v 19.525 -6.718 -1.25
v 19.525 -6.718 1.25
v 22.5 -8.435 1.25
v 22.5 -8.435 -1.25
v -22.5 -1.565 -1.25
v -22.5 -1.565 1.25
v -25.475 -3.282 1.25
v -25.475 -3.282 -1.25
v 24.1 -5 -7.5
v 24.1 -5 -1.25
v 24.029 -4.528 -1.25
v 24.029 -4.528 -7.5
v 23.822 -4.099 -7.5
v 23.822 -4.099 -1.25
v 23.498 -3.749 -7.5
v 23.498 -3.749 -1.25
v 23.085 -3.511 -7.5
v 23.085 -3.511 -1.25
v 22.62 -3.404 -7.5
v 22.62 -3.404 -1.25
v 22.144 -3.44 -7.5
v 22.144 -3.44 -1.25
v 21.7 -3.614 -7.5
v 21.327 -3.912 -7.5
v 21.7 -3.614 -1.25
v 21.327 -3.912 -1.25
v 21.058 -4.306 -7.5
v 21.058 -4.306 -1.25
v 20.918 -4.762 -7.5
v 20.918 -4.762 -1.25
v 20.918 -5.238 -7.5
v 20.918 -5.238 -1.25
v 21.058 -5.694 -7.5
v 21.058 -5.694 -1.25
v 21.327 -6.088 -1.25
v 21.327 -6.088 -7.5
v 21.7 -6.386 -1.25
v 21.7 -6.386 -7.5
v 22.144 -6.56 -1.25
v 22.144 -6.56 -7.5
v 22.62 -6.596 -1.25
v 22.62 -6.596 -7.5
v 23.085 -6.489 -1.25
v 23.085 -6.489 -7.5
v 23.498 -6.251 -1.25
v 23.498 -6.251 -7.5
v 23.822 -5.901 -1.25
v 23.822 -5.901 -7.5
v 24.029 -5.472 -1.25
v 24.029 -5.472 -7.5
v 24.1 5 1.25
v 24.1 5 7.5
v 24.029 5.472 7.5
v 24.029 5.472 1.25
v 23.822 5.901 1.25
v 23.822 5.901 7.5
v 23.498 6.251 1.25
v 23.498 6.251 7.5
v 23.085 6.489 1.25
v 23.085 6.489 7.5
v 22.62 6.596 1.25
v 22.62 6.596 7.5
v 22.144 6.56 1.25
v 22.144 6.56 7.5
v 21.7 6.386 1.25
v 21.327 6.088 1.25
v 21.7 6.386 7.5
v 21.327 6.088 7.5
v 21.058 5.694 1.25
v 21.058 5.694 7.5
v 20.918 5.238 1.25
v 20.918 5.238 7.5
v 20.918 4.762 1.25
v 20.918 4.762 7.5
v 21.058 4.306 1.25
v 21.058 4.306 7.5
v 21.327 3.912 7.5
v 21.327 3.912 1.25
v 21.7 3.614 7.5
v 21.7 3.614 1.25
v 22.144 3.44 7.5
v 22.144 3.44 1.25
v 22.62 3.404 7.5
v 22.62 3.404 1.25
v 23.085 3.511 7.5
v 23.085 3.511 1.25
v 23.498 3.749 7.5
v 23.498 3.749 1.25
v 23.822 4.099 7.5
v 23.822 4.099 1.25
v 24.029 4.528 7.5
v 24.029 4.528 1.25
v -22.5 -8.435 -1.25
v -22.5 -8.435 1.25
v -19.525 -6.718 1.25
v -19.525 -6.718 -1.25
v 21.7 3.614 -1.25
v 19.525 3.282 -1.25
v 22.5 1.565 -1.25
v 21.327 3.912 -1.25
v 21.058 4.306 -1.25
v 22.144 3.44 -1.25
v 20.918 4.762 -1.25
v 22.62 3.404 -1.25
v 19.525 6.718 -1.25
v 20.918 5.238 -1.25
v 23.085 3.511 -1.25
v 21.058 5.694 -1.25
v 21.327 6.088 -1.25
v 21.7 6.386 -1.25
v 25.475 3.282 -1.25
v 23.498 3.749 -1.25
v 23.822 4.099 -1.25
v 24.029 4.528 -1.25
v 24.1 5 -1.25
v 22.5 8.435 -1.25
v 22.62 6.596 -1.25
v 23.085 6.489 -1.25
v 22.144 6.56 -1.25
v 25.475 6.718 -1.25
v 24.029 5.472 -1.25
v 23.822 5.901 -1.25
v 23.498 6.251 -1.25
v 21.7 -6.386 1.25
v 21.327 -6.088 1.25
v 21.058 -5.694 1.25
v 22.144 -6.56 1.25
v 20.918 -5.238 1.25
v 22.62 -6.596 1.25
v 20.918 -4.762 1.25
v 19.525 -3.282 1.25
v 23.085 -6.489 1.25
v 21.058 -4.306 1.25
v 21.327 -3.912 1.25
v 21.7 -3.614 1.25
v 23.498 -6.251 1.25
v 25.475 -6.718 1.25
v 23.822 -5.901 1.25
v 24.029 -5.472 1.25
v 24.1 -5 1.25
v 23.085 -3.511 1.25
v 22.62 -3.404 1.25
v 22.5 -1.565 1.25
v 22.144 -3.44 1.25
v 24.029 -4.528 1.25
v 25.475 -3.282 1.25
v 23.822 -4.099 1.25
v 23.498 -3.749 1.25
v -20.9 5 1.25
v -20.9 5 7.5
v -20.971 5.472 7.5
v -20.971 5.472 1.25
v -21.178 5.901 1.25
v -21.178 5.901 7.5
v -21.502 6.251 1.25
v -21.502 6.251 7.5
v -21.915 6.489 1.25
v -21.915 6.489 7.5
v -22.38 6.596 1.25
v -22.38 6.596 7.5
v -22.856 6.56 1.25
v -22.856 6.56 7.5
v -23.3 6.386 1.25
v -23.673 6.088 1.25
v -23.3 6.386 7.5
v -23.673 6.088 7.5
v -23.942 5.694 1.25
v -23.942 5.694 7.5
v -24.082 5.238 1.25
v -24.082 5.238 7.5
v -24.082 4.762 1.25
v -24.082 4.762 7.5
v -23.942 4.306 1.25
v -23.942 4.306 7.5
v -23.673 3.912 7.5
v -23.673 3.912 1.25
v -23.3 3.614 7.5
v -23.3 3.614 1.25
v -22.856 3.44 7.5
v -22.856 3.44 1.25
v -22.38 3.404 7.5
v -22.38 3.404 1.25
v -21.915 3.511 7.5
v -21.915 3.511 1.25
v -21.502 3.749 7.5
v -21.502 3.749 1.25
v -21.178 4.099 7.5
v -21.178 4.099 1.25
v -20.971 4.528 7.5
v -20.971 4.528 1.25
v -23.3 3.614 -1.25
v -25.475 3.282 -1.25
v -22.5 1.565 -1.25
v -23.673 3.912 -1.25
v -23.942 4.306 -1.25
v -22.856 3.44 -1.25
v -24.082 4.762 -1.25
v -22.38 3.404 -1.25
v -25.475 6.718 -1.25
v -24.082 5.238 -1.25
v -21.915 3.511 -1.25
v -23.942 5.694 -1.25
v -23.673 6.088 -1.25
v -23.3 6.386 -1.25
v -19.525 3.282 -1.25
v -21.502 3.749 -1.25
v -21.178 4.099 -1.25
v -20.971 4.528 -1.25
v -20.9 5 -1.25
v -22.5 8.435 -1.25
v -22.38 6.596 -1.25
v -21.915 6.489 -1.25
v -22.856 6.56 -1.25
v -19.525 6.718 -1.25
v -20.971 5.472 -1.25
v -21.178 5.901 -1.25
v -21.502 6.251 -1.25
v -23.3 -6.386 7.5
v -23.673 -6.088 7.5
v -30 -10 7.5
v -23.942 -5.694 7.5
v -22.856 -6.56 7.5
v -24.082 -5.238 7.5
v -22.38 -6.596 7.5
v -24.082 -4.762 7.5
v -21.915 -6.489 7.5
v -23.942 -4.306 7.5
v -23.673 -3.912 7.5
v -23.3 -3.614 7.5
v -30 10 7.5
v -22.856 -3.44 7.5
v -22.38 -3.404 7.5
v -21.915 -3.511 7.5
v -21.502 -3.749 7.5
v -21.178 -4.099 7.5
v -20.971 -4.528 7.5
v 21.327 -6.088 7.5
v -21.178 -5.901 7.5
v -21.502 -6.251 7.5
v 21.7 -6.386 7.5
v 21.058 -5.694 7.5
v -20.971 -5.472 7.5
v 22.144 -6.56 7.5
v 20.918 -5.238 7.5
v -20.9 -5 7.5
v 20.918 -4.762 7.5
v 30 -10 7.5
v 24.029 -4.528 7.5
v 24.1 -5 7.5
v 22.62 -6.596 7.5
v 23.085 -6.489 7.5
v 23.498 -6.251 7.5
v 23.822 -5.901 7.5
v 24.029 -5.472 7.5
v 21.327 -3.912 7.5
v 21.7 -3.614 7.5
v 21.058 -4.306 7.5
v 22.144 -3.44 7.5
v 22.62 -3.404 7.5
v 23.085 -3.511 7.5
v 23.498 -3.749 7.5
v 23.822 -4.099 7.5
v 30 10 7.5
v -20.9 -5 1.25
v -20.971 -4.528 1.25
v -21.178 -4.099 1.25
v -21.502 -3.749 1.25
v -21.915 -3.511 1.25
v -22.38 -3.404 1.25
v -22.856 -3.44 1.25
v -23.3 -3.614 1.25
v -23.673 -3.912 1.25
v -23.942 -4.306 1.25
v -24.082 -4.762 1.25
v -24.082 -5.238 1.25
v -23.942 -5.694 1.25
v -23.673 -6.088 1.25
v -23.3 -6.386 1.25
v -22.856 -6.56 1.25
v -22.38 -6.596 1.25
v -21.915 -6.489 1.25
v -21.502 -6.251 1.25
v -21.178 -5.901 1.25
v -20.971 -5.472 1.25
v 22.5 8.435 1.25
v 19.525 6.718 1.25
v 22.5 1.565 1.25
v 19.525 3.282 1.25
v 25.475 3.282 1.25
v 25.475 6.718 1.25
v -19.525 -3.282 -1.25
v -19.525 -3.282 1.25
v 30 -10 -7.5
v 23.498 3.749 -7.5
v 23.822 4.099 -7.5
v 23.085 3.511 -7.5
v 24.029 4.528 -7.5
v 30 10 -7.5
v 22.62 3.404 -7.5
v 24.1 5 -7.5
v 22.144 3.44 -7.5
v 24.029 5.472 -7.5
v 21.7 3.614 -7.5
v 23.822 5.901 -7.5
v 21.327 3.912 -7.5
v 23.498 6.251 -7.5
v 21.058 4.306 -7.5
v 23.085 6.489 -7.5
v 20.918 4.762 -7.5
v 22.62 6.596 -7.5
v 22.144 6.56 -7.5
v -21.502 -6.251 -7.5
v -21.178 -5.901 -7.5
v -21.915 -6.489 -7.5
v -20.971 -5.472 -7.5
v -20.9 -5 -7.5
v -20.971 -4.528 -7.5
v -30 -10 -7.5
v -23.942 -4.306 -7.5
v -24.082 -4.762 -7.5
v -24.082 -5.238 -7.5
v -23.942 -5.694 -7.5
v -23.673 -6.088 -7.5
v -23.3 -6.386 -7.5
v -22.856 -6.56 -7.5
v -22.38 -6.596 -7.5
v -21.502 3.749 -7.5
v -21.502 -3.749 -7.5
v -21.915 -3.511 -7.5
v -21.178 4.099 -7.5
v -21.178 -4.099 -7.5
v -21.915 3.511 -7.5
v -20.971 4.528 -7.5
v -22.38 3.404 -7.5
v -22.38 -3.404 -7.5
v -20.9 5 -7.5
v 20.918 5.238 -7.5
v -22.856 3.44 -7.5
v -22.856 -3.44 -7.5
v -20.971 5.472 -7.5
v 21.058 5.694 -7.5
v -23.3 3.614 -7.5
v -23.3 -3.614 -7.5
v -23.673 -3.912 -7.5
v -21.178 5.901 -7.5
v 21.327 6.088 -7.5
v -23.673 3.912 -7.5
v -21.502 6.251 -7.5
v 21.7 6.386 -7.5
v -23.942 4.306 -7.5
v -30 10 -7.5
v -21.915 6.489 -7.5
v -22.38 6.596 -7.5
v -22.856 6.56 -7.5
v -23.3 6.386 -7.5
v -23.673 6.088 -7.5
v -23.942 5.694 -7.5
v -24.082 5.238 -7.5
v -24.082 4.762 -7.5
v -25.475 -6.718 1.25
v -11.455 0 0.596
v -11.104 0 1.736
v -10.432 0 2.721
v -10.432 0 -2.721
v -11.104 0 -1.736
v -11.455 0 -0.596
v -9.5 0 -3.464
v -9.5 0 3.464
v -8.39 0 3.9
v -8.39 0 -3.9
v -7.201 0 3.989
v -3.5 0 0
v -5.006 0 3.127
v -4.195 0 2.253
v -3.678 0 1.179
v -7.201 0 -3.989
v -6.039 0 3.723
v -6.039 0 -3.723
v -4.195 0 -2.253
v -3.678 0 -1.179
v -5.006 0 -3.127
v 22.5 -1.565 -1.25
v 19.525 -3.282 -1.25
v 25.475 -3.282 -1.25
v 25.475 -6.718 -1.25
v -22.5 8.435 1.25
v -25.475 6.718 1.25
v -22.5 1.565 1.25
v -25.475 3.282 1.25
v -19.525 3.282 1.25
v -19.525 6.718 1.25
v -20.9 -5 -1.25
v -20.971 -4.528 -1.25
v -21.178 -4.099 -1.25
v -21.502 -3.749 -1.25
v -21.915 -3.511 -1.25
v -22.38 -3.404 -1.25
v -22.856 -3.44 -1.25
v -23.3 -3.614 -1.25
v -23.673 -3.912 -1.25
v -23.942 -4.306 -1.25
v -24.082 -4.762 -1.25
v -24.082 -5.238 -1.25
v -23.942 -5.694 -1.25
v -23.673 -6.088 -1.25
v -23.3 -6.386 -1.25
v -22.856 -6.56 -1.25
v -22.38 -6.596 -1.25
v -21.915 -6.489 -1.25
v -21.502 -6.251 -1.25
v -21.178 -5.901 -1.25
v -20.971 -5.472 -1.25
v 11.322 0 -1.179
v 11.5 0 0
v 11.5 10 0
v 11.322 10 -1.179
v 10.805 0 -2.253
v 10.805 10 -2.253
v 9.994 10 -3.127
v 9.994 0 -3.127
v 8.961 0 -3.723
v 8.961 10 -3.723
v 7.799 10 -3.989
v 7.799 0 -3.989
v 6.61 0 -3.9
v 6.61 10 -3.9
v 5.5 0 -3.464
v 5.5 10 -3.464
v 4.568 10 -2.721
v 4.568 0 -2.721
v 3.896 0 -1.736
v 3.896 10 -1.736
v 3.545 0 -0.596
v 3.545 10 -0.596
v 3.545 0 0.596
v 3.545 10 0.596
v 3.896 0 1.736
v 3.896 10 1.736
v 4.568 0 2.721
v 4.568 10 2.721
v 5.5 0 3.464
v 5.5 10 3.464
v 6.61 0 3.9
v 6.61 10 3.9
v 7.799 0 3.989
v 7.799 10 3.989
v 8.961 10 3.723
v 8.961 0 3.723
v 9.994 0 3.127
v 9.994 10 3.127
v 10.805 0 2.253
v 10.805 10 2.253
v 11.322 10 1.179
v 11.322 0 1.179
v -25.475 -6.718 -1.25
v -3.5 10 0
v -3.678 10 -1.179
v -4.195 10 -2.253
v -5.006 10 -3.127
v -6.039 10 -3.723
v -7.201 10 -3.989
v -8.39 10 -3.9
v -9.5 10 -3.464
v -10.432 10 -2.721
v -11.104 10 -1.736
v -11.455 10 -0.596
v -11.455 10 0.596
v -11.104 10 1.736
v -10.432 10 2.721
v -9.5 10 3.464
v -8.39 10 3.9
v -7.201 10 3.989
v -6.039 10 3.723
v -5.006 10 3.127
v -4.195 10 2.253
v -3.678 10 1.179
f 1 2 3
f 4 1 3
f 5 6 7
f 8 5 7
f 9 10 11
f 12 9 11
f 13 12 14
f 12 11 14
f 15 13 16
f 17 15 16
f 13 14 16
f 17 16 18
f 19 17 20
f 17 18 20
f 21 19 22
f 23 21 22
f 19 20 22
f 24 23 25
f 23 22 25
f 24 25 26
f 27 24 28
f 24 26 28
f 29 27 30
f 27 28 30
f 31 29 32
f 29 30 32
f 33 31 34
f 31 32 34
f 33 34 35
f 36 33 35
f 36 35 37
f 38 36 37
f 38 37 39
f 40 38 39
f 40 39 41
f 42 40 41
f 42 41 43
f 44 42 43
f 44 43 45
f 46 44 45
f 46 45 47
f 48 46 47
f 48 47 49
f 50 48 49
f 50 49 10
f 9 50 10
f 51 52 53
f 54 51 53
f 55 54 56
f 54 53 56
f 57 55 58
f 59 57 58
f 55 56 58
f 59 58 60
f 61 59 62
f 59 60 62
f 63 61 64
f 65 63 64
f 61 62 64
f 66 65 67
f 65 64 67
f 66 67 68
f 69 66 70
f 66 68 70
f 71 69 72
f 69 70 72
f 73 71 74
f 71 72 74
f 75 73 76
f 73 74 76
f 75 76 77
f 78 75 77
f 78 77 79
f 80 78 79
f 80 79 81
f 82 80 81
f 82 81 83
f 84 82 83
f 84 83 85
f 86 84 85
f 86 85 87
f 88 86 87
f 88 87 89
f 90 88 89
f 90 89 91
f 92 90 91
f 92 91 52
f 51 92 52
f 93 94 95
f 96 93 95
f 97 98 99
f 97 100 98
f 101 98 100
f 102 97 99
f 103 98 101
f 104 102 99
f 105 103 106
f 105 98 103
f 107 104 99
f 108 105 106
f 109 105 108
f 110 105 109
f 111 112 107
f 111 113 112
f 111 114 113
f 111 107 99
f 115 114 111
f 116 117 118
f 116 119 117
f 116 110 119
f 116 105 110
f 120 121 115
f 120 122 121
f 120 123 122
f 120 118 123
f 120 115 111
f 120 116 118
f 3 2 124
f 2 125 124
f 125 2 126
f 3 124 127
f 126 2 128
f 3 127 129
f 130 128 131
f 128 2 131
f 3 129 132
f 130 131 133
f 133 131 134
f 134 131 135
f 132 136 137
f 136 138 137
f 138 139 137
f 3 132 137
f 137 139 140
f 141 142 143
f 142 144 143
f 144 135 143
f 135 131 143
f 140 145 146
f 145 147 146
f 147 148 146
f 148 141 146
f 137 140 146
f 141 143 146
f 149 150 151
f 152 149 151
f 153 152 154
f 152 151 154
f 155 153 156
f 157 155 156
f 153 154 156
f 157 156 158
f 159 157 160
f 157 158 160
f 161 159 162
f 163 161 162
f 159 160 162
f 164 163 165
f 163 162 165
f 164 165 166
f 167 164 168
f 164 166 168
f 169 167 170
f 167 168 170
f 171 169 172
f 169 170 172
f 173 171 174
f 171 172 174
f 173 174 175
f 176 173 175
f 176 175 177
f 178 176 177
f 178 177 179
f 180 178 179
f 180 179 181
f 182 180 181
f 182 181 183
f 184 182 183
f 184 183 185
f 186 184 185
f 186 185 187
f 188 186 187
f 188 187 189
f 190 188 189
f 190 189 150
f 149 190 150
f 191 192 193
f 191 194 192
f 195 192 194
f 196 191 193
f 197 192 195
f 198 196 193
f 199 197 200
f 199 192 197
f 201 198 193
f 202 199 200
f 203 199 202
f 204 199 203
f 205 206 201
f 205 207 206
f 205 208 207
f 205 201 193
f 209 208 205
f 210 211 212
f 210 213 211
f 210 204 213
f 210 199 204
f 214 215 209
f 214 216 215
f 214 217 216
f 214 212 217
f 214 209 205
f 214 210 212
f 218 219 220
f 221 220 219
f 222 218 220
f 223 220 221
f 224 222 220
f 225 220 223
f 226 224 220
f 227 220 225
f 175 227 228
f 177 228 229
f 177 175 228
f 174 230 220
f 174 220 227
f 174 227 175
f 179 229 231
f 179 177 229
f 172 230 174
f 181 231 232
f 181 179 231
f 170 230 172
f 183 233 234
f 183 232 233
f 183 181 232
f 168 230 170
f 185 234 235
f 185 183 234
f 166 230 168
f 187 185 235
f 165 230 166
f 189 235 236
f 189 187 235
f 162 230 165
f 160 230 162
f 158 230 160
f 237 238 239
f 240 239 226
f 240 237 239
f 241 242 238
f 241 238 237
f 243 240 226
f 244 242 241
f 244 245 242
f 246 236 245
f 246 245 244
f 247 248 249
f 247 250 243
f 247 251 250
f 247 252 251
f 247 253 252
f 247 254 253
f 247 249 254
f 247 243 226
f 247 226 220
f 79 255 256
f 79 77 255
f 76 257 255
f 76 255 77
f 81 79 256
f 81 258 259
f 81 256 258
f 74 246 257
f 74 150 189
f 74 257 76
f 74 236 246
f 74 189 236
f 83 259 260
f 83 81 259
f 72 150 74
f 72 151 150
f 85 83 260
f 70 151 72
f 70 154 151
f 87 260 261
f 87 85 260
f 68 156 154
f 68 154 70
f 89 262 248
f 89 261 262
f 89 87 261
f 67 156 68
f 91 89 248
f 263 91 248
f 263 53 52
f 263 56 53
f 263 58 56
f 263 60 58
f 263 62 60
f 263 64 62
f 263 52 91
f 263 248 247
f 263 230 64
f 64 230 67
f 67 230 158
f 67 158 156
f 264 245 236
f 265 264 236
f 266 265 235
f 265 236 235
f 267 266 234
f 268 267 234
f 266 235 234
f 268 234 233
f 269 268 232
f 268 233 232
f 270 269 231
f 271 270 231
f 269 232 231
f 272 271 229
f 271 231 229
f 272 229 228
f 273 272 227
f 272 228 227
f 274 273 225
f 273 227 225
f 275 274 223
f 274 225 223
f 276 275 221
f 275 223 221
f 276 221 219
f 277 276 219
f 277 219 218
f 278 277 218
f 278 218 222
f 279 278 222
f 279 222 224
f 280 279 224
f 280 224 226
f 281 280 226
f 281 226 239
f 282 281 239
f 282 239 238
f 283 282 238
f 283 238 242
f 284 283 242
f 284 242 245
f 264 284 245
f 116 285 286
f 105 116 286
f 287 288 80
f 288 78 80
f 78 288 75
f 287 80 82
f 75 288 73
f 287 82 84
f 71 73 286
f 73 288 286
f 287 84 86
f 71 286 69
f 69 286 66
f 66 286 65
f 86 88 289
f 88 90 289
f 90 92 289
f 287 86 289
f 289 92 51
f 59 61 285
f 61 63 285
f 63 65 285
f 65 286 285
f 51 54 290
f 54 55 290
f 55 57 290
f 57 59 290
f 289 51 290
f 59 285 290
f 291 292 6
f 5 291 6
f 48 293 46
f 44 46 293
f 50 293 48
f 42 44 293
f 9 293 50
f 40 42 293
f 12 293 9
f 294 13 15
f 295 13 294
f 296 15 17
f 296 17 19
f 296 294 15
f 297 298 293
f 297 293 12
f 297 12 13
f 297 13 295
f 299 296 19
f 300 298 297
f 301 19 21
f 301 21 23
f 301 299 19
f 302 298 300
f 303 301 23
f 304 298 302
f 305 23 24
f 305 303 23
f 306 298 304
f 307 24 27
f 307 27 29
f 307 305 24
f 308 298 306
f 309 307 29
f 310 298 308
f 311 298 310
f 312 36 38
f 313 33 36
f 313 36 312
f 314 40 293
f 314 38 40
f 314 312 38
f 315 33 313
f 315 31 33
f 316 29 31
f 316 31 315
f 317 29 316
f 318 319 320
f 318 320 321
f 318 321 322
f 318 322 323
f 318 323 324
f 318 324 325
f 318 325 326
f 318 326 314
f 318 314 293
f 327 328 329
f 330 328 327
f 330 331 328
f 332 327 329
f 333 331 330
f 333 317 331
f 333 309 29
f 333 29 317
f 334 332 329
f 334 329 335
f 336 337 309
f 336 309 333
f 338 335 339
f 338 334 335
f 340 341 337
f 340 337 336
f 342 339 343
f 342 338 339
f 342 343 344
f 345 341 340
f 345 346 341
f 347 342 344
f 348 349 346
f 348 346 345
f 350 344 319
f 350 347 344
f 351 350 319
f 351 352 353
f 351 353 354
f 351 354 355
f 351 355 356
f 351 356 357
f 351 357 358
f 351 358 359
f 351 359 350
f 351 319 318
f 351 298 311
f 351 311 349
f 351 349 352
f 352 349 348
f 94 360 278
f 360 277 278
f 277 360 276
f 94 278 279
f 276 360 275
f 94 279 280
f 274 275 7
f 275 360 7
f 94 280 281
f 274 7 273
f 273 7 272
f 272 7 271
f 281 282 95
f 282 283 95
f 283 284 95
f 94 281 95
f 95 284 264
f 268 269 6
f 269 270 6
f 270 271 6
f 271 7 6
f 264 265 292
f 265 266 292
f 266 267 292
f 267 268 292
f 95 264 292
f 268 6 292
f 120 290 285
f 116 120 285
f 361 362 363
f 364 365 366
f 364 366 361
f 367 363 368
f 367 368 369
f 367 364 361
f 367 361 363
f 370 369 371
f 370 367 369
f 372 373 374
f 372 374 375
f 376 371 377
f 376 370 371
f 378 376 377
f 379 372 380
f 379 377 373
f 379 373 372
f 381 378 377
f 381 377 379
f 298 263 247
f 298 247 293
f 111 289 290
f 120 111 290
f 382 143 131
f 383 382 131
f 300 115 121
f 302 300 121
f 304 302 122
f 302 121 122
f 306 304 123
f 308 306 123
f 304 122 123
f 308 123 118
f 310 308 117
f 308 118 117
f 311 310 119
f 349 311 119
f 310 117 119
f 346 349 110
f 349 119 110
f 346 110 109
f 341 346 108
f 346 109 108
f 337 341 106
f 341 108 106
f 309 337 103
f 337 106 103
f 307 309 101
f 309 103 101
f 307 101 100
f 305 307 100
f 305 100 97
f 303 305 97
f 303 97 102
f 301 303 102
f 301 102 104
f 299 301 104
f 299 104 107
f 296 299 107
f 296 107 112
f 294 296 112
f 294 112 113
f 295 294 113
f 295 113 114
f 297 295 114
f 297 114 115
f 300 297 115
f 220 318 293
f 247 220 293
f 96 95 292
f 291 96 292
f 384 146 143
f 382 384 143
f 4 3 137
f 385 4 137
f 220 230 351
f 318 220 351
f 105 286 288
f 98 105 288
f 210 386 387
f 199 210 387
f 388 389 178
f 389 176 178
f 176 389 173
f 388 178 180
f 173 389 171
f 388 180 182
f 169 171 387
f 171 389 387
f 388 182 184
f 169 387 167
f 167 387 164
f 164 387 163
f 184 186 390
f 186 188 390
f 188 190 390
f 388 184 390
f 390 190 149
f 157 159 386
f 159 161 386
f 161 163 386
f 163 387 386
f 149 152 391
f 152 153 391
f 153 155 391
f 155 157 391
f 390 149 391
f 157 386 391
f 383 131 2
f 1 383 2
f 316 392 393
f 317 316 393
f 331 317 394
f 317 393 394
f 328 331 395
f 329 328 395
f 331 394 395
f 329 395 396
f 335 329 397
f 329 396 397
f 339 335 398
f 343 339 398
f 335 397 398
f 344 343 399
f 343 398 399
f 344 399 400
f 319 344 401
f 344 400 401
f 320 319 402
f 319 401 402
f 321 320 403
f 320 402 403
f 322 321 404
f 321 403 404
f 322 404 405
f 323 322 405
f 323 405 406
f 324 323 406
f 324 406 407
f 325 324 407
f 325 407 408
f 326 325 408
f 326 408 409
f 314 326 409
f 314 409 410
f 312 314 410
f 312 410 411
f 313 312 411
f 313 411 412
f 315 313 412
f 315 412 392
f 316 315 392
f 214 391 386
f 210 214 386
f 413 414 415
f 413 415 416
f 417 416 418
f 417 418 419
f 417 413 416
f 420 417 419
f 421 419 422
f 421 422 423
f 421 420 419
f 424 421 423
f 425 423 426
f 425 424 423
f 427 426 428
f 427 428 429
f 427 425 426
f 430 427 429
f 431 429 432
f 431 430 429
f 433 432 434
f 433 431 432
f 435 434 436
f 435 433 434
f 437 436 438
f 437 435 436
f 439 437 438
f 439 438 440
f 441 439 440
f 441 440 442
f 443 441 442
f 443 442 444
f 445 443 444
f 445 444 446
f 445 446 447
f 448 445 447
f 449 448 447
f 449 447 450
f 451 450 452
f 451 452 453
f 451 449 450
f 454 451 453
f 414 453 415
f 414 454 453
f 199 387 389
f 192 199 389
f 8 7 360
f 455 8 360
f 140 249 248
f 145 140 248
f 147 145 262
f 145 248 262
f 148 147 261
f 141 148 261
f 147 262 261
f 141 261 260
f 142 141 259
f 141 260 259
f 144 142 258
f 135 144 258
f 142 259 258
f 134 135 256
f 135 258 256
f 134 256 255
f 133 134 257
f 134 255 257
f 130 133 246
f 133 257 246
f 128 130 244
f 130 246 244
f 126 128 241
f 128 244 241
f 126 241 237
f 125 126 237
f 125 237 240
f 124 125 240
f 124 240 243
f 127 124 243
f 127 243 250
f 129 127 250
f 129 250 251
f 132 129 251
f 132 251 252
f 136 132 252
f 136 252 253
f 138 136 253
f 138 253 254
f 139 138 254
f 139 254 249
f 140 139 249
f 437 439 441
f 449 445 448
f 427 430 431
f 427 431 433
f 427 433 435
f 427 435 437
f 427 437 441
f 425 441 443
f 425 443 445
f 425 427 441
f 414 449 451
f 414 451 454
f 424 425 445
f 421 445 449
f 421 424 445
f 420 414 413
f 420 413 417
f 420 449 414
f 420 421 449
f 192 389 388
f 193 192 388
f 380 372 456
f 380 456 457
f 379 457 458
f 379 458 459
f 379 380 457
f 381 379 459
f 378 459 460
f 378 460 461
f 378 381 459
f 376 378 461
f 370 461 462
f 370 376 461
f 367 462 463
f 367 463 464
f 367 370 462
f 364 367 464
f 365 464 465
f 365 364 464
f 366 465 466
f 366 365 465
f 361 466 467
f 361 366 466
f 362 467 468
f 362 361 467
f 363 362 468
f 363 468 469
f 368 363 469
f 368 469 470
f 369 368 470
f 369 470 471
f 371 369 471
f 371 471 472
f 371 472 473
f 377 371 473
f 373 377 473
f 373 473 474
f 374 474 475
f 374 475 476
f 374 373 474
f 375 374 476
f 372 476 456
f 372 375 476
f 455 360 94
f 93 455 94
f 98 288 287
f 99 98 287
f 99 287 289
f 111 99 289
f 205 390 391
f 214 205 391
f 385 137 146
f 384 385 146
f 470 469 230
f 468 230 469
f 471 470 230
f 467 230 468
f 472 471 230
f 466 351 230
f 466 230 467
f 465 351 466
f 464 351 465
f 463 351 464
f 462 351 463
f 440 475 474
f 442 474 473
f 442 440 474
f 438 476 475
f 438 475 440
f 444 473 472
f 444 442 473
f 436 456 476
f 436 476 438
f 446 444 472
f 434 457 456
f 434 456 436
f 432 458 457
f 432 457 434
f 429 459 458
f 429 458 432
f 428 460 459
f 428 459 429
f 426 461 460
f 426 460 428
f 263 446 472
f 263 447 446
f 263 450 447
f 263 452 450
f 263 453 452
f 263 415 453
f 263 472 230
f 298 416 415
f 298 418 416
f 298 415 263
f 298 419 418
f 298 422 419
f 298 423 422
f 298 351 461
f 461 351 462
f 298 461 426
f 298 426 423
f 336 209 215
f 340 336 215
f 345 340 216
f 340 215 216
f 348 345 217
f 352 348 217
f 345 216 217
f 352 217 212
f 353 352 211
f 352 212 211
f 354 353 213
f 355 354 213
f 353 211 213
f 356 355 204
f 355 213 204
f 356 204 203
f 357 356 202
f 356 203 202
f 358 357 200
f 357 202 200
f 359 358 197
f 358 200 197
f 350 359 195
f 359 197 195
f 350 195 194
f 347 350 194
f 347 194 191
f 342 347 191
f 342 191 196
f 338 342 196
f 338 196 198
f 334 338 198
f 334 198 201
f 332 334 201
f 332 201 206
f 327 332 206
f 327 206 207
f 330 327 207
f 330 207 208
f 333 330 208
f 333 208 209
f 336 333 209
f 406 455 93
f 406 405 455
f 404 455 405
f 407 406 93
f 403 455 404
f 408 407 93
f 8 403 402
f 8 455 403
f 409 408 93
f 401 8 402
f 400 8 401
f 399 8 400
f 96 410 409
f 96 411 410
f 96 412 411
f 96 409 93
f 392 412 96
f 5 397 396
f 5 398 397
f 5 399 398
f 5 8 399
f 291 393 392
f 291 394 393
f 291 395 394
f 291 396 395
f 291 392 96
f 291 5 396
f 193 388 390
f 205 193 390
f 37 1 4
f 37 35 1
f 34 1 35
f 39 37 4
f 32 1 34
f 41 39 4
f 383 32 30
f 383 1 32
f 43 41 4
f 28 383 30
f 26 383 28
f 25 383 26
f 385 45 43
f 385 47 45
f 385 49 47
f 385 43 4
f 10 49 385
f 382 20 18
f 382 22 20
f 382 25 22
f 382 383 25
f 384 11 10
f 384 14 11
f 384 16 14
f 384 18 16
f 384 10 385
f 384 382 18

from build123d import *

# Parameters (mm, degrees)
SKETCH2_W           = 60
SKETCH2_H           = 15
SKETCH2_R           = 4
BOSS_EXTRUDE1_DEPTH = 10
SKETCH2_3_W         = 60
SKETCH2_3_H         = 15
BOSS_EXTRUDE2_DEPTH = 10
SKETCH4_R           = 1.6
CUT_EXTRUDE1_DEPTH  = 36
CUT_EXTRUDE2_START  = -6.25
SKETCH4_3_R         = 1.6
CUT_EXTRUDE2_DEPTH  = 2.5


with BuildPart() as part:
    # Sketch2 → Boss-Extrude1 (new body)
    with BuildSketch(Plane(origin=(0, 0, 0), x_dir=(1, 0, 0), z_dir=(0, 1, 0))):
        Rectangle(SKETCH2_W, SKETCH2_H)
        with Locations((-7.5, 0)):
            Circle(SKETCH2_R, mode=Mode.SUBTRACT)
        with Locations((7.5, 0)):
            Circle(SKETCH2_R, mode=Mode.SUBTRACT)
    extrude(amount=BOSS_EXTRUDE1_DEPTH)

    # Sketch2<3> → Boss-Extrude2 (add)
    with BuildSketch(Plane(origin=(0, 0, 0), x_dir=(1, 0, 0), z_dir=(0, 1, 0))):
        Rectangle(SKETCH2_3_W, SKETCH2_3_H)
    extrude(amount=-BOSS_EXTRUDE2_DEPTH)

    # Sketch4 → Cut-Extrude1 (cut, through all)
    with BuildSketch(Plane.XY.offset(7.5)):
        with Locations((22.5, 5)):
            Circle(SKETCH4_R)
        with Locations((22.5, -5)):
            Circle(SKETCH4_R)
        with Locations((-22.5, -5)):
            Circle(SKETCH4_R)
        with Locations((-22.5, 5)):
            Circle(SKETCH4_R)
    extrude(amount=-CUT_EXTRUDE1_DEPTH, mode=Mode.SUBTRACT)

    # Sketch4<3> → Cut-Extrude2 (cut)
    # profile 1 of 4: a face of its own
    with BuildSketch(Plane.XY.offset(7.5).offset(CUT_EXTRUDE2_START)):
        Polygon((-22.5, 8.435234102), (-25.475, 6.717617051), (-25.475, 3.282382949), (-22.5, 1.564765898), (-19.525, 3.282382949), (-19.525, 6.717617051), align=None)
        with Locations((-22.5, 5)):
            Circle(SKETCH4_3_R, mode=Mode.SUBTRACT)
    # profile 2 of 4: a face of its own
    with BuildSketch(Plane.XY.offset(7.5).offset(CUT_EXTRUDE2_START)):
        Polygon((22.5, 8.435234102), (19.525, 6.717617051), (19.525, 3.282382949), (22.5, 1.564765898), (25.475, 3.282382949), (25.475, 6.717617051), align=None)
        with Locations((22.5, 5)):
            Circle(SKETCH4_3_R, mode=Mode.SUBTRACT)
    # profile 3 of 4: a face of its own
    with BuildSketch(Plane.XY.offset(7.5).offset(CUT_EXTRUDE2_START)):
        Polygon((-22.5, -8.435234102), (-19.525, -6.717617051), (-19.525, -3.282382949), (-22.5, -1.564765898), (-25.475, -3.282382949), (-25.475, -6.717617051), align=None)
        with Locations((-22.5, -5)):
            Circle(SKETCH4_3_R, mode=Mode.SUBTRACT)
    # profile 4 of 4: a face of its own
    with BuildSketch(Plane.XY.offset(7.5).offset(CUT_EXTRUDE2_START)):
        Polygon((22.5, -8.435234102), (25.475, -6.717617051), (25.475, -3.282382949), (22.5, -1.564765898), (19.525, -3.282382949), (19.525, -6.717617051), align=None)
        with Locations((22.5, -5)):
            Circle(SKETCH4_3_R, mode=Mode.SUBTRACT)
    extrude(amount=-CUT_EXTRUDE2_DEPTH, mode=Mode.SUBTRACT)


solid = part.part
